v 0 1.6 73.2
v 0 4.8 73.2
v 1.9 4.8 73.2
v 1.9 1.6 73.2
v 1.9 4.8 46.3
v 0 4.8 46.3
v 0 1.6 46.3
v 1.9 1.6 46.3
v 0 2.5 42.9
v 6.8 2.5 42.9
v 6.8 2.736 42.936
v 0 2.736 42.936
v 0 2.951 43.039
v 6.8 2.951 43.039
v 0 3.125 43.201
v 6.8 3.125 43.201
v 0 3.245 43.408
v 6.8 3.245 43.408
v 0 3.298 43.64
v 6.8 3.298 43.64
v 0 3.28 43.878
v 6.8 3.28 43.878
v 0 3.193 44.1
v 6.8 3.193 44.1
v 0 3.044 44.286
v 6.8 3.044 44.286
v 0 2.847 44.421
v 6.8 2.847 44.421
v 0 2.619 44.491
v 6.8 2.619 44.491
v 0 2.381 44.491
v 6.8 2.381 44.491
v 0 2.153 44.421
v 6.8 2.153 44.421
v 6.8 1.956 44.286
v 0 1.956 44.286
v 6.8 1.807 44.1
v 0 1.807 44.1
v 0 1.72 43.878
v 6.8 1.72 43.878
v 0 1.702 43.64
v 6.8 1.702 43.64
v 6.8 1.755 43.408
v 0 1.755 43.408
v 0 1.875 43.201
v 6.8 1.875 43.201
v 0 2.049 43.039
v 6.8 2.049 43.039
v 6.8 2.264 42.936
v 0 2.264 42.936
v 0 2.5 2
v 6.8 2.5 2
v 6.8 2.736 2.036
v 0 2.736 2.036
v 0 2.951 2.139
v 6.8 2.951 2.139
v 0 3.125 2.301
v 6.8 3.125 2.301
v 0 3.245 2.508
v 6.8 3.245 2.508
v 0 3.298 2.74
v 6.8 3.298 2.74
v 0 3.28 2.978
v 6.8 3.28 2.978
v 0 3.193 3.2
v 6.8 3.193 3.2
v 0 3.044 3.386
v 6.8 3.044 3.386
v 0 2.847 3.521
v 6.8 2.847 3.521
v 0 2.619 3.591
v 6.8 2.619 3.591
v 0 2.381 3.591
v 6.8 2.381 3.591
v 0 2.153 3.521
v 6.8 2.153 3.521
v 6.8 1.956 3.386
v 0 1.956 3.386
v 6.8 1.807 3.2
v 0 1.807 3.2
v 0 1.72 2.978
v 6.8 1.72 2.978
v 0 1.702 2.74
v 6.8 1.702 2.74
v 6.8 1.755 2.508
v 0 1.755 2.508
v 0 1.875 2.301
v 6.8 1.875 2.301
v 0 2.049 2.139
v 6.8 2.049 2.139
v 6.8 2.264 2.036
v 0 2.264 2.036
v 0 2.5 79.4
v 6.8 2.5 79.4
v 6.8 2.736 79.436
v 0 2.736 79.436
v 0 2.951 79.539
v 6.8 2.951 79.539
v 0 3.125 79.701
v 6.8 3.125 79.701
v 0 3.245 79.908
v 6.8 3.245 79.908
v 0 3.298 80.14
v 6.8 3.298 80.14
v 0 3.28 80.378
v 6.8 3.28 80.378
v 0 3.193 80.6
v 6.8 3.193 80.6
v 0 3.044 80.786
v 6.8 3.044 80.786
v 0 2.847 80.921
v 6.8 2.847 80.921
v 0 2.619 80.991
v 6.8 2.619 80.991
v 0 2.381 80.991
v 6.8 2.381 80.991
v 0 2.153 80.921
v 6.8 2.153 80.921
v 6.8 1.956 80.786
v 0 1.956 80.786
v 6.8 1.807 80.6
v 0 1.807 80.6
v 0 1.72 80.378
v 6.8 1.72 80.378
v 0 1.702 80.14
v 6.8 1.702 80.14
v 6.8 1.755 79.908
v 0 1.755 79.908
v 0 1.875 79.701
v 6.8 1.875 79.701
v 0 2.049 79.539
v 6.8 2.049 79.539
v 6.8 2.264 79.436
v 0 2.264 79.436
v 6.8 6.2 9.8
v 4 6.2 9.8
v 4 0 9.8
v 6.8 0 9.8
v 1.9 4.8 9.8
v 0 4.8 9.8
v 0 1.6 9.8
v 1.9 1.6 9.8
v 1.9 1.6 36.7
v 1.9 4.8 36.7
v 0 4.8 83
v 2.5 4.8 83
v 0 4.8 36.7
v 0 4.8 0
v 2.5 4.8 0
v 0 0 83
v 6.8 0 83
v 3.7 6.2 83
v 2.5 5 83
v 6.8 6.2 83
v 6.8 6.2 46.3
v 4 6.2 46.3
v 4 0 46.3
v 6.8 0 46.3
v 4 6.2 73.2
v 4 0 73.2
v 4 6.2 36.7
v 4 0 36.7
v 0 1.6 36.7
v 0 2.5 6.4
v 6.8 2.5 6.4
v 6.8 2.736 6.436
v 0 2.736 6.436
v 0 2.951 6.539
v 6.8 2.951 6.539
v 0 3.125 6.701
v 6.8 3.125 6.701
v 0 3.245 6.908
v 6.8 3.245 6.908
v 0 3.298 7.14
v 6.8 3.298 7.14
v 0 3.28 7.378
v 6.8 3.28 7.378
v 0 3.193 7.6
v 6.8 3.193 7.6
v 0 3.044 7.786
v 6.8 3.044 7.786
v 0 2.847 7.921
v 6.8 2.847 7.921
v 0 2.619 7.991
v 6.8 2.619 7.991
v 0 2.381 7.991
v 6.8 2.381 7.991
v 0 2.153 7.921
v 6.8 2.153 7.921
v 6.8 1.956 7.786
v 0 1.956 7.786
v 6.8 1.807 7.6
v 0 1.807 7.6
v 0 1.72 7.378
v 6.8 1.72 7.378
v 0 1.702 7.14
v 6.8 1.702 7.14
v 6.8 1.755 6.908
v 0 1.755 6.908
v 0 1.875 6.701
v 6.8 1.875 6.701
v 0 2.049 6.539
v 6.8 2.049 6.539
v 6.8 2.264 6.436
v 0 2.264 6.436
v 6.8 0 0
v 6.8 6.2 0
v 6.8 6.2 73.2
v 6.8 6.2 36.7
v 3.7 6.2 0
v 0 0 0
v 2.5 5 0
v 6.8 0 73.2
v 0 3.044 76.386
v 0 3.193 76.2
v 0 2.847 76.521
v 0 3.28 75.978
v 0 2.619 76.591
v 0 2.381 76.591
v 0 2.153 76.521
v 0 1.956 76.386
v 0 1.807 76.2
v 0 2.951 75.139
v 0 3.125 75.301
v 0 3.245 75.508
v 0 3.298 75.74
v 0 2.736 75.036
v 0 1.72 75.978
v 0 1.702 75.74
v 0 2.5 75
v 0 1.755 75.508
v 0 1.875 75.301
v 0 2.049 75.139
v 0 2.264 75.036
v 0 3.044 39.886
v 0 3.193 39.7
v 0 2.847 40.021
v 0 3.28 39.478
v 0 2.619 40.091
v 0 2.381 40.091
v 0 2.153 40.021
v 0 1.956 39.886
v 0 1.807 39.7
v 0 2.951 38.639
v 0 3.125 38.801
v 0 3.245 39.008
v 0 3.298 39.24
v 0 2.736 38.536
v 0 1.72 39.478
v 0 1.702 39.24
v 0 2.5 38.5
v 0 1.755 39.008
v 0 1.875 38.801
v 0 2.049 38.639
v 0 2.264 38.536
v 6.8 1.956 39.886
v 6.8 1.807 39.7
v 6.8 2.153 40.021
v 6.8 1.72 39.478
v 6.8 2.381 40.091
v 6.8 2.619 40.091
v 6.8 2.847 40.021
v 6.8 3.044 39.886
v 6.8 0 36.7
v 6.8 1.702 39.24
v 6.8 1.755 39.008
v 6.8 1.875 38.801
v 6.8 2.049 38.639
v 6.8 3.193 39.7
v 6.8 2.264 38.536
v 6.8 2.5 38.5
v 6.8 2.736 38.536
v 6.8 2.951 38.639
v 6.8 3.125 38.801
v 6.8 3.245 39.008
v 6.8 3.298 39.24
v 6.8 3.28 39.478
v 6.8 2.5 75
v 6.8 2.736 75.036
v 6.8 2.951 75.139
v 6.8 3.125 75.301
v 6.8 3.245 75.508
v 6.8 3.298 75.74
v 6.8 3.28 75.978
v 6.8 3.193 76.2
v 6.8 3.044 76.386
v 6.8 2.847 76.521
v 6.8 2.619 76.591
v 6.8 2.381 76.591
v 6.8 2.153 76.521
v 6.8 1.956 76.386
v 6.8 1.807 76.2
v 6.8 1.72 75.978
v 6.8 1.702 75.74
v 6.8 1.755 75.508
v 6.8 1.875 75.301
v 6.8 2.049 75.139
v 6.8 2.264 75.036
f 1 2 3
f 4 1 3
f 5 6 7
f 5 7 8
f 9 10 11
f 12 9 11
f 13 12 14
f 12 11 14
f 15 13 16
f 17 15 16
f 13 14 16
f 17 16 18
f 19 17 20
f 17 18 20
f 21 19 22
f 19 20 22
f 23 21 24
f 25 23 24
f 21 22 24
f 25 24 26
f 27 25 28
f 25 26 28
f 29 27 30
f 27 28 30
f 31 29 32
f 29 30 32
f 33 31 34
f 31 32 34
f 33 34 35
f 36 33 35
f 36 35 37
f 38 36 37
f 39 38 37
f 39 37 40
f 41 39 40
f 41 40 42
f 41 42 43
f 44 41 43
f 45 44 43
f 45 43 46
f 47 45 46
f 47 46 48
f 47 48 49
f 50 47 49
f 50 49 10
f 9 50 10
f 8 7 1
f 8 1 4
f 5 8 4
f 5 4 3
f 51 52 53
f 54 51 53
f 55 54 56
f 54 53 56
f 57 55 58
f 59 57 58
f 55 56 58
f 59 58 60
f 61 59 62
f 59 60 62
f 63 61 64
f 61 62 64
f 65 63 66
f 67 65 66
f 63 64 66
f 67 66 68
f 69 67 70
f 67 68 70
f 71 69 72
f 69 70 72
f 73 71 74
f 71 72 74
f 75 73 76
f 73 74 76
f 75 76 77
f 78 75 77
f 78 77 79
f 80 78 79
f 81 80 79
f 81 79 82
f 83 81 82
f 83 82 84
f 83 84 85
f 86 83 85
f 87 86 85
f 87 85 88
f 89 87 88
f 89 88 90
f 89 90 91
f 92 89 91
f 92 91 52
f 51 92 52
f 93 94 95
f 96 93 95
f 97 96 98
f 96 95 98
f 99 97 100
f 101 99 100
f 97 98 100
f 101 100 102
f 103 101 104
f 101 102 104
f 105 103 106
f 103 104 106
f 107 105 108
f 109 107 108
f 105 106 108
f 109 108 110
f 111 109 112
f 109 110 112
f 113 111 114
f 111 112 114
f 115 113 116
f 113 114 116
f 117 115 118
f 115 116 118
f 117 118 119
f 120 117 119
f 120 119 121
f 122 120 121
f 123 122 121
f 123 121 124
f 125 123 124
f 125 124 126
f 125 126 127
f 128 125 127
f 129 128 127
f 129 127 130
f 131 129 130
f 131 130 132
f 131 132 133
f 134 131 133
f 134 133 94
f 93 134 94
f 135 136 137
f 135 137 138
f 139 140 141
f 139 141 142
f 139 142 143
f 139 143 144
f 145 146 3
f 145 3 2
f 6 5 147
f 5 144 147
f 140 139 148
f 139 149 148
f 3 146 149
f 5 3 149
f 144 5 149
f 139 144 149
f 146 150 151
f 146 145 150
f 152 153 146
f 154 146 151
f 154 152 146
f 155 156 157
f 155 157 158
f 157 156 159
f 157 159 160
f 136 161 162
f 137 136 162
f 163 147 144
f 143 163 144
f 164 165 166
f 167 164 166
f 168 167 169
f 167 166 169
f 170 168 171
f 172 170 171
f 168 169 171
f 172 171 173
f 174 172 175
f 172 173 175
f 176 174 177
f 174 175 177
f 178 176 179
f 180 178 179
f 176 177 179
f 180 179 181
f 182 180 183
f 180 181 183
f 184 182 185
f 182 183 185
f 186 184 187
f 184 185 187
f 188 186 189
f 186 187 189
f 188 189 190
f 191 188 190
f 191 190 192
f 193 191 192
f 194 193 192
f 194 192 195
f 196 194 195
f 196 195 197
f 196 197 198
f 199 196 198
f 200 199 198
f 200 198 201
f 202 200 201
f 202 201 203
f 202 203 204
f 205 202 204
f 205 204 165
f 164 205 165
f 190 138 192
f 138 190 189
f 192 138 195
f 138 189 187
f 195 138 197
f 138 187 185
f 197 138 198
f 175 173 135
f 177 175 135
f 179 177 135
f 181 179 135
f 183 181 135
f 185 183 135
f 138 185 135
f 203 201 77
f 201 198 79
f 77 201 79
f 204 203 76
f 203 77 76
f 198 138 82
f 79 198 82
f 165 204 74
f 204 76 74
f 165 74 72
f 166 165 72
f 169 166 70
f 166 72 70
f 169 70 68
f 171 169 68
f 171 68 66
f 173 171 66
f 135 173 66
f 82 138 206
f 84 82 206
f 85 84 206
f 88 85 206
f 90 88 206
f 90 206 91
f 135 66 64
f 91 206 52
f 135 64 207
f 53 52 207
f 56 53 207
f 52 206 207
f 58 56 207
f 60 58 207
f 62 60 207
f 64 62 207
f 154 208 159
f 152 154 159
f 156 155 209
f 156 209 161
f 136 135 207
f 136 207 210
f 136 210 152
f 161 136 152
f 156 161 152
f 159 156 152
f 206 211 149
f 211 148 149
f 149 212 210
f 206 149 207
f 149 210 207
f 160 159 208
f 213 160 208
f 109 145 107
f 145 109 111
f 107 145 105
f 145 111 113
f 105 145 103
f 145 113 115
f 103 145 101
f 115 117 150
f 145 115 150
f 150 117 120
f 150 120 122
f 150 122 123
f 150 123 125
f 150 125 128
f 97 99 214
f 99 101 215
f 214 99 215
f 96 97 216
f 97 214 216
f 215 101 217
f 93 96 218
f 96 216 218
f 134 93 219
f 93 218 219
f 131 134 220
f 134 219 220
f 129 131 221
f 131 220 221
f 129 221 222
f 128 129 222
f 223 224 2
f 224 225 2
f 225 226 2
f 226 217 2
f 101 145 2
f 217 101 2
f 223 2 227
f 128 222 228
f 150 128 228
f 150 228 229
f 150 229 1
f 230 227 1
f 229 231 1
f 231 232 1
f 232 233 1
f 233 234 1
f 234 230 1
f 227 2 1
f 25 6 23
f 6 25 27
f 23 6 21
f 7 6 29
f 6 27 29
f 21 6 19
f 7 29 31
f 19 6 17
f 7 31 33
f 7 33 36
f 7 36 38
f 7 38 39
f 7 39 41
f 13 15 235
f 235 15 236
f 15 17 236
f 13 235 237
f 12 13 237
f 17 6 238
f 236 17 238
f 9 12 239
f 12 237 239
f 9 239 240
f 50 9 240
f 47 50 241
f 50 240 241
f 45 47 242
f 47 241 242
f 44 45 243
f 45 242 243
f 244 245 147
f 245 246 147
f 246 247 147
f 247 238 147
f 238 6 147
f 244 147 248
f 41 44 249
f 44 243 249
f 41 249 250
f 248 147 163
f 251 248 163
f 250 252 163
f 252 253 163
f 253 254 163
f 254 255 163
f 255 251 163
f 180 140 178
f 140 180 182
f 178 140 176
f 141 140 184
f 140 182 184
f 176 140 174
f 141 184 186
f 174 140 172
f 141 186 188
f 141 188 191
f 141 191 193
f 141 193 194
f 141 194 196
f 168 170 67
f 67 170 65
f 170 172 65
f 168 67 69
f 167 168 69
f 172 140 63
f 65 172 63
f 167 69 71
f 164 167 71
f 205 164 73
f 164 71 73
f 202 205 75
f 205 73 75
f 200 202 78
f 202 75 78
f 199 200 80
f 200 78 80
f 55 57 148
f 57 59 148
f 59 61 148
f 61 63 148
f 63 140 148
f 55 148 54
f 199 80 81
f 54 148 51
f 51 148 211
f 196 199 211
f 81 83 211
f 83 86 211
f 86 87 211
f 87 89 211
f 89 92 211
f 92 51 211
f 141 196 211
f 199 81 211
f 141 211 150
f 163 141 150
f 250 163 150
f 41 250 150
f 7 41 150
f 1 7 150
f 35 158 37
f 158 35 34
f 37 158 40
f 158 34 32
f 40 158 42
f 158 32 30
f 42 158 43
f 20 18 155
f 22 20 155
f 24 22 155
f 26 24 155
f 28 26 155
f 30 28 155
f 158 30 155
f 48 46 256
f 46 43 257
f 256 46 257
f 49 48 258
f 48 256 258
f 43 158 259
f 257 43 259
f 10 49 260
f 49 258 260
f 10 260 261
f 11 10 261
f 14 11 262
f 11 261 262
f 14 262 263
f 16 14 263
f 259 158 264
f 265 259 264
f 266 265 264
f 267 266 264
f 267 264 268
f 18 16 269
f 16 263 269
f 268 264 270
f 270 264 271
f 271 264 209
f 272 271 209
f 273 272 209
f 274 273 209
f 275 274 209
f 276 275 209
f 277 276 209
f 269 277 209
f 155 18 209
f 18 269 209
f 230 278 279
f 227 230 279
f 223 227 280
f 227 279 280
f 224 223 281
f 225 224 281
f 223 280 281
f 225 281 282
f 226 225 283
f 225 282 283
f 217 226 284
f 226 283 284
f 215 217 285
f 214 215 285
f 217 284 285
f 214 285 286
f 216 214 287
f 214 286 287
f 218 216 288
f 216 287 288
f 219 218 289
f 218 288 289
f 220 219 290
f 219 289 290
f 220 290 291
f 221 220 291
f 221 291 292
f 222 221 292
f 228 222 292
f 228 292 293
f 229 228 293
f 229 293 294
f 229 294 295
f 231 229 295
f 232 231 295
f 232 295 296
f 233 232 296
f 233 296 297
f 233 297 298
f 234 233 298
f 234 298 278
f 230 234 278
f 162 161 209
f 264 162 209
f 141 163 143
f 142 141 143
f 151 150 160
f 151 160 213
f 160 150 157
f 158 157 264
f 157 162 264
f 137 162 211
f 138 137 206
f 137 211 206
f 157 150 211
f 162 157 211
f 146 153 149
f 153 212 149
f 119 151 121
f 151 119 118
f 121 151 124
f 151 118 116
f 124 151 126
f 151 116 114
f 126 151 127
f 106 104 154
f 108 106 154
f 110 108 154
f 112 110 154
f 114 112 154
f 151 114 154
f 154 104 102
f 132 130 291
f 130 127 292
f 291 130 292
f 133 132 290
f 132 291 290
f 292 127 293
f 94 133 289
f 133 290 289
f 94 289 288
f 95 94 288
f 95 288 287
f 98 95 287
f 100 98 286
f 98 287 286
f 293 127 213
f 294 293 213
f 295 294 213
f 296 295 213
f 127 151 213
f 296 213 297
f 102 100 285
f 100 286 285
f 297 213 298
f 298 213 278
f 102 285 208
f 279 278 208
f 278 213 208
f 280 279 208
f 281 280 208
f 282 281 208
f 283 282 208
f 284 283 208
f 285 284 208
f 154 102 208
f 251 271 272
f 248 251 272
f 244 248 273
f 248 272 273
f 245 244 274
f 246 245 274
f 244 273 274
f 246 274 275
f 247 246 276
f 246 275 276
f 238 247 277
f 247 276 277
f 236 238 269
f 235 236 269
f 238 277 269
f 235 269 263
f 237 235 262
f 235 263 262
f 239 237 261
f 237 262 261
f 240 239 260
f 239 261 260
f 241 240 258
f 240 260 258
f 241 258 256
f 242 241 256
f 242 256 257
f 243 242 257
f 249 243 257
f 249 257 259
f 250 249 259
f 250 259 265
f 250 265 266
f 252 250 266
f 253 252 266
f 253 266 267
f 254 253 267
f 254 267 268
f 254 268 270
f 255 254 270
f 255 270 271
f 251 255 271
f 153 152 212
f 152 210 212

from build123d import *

# Parameters (mm, degrees)
BOSS_EXTRUDE1_DEPTH         = 9.8
BOSS_EXTRUDE2_DEPTH         = 26.9
BOSS_EXTRUDE3_DEPTH         = 9.6
BOSS_EXTRUDE4_DEPTH         = 26.9
BOSS_EXTRUDE5_DEPTH         = 9.8
TAP_DRILL_FOR_M2X0_4_TAP1_D = 1.6


with BuildPart() as part:
    # Sketch2 → Boss-Extrude1 (new body)
    with BuildSketch(Plane.XY):
        Polygon((0, 0), (6.8, 0), (6.8, 6.2), (3.7, 6.2), (2.5, 5), (2.5, 4.8), (0, 4.8), align=None)
    extrude(amount=BOSS_EXTRUDE1_DEPTH)

    # Sketch3 → Boss-Extrude2 (add)
    with BuildSketch(Plane.XY.offset(9.8)):
        Polygon((0, 0), (0, 1.6), (1.9, 1.6), (1.9, 4.8), (2.5, 4.8), (2.5, 5), (3.7, 6.2), (4, 6.2), (4, 0), align=None)
    extrude(amount=BOSS_EXTRUDE2_DEPTH)

    # Sketch6 → Boss-Extrude3 (add)
    with BuildSketch(Plane.XY.offset(36.7)):
        Polygon((0, 0), (6.8, 0), (6.8, 6.2), (3.7, 6.2), (2.5, 5), (2.5, 4.8), (0, 4.8), align=None)
    extrude(amount=BOSS_EXTRUDE3_DEPTH)

    # Sketch7 → Boss-Extrude4 (add)
    with BuildSketch(Plane.XY.offset(46.3)):
        Polygon((0, 0), (0, 1.6), (1.9, 1.6), (1.9, 4.8), (2.5, 4.8), (2.5, 5), (3.7, 6.2), (4, 6.2), (4, 0), align=None)
    extrude(amount=BOSS_EXTRUDE4_DEPTH)

    # Sketch8 → Boss-Extrude5 (add)
    with BuildSketch(Plane.XY.offset(73.2)):
        Polygon((0, 0), (6.8, 0), (6.8, 6.2), (3.7, 6.2), (2.5, 5), (2.5, 4.8), (0, 4.8), align=None)
    extrude(amount=BOSS_EXTRUDE5_DEPTH)

    # Tap Drill for M2x0.4 Tap1 (through all)
    with Locations(Plane.ZY):
        with Locations((7.2, 2.5), (2.8, 2.5), (39.3, 2.5), (43.7, 2.5), (75.8, 2.5), (80.2, 2.5)):
            Hole(TAP_DRILL_FOR_M2X0_4_TAP1_D / 2)


solid = part.part
